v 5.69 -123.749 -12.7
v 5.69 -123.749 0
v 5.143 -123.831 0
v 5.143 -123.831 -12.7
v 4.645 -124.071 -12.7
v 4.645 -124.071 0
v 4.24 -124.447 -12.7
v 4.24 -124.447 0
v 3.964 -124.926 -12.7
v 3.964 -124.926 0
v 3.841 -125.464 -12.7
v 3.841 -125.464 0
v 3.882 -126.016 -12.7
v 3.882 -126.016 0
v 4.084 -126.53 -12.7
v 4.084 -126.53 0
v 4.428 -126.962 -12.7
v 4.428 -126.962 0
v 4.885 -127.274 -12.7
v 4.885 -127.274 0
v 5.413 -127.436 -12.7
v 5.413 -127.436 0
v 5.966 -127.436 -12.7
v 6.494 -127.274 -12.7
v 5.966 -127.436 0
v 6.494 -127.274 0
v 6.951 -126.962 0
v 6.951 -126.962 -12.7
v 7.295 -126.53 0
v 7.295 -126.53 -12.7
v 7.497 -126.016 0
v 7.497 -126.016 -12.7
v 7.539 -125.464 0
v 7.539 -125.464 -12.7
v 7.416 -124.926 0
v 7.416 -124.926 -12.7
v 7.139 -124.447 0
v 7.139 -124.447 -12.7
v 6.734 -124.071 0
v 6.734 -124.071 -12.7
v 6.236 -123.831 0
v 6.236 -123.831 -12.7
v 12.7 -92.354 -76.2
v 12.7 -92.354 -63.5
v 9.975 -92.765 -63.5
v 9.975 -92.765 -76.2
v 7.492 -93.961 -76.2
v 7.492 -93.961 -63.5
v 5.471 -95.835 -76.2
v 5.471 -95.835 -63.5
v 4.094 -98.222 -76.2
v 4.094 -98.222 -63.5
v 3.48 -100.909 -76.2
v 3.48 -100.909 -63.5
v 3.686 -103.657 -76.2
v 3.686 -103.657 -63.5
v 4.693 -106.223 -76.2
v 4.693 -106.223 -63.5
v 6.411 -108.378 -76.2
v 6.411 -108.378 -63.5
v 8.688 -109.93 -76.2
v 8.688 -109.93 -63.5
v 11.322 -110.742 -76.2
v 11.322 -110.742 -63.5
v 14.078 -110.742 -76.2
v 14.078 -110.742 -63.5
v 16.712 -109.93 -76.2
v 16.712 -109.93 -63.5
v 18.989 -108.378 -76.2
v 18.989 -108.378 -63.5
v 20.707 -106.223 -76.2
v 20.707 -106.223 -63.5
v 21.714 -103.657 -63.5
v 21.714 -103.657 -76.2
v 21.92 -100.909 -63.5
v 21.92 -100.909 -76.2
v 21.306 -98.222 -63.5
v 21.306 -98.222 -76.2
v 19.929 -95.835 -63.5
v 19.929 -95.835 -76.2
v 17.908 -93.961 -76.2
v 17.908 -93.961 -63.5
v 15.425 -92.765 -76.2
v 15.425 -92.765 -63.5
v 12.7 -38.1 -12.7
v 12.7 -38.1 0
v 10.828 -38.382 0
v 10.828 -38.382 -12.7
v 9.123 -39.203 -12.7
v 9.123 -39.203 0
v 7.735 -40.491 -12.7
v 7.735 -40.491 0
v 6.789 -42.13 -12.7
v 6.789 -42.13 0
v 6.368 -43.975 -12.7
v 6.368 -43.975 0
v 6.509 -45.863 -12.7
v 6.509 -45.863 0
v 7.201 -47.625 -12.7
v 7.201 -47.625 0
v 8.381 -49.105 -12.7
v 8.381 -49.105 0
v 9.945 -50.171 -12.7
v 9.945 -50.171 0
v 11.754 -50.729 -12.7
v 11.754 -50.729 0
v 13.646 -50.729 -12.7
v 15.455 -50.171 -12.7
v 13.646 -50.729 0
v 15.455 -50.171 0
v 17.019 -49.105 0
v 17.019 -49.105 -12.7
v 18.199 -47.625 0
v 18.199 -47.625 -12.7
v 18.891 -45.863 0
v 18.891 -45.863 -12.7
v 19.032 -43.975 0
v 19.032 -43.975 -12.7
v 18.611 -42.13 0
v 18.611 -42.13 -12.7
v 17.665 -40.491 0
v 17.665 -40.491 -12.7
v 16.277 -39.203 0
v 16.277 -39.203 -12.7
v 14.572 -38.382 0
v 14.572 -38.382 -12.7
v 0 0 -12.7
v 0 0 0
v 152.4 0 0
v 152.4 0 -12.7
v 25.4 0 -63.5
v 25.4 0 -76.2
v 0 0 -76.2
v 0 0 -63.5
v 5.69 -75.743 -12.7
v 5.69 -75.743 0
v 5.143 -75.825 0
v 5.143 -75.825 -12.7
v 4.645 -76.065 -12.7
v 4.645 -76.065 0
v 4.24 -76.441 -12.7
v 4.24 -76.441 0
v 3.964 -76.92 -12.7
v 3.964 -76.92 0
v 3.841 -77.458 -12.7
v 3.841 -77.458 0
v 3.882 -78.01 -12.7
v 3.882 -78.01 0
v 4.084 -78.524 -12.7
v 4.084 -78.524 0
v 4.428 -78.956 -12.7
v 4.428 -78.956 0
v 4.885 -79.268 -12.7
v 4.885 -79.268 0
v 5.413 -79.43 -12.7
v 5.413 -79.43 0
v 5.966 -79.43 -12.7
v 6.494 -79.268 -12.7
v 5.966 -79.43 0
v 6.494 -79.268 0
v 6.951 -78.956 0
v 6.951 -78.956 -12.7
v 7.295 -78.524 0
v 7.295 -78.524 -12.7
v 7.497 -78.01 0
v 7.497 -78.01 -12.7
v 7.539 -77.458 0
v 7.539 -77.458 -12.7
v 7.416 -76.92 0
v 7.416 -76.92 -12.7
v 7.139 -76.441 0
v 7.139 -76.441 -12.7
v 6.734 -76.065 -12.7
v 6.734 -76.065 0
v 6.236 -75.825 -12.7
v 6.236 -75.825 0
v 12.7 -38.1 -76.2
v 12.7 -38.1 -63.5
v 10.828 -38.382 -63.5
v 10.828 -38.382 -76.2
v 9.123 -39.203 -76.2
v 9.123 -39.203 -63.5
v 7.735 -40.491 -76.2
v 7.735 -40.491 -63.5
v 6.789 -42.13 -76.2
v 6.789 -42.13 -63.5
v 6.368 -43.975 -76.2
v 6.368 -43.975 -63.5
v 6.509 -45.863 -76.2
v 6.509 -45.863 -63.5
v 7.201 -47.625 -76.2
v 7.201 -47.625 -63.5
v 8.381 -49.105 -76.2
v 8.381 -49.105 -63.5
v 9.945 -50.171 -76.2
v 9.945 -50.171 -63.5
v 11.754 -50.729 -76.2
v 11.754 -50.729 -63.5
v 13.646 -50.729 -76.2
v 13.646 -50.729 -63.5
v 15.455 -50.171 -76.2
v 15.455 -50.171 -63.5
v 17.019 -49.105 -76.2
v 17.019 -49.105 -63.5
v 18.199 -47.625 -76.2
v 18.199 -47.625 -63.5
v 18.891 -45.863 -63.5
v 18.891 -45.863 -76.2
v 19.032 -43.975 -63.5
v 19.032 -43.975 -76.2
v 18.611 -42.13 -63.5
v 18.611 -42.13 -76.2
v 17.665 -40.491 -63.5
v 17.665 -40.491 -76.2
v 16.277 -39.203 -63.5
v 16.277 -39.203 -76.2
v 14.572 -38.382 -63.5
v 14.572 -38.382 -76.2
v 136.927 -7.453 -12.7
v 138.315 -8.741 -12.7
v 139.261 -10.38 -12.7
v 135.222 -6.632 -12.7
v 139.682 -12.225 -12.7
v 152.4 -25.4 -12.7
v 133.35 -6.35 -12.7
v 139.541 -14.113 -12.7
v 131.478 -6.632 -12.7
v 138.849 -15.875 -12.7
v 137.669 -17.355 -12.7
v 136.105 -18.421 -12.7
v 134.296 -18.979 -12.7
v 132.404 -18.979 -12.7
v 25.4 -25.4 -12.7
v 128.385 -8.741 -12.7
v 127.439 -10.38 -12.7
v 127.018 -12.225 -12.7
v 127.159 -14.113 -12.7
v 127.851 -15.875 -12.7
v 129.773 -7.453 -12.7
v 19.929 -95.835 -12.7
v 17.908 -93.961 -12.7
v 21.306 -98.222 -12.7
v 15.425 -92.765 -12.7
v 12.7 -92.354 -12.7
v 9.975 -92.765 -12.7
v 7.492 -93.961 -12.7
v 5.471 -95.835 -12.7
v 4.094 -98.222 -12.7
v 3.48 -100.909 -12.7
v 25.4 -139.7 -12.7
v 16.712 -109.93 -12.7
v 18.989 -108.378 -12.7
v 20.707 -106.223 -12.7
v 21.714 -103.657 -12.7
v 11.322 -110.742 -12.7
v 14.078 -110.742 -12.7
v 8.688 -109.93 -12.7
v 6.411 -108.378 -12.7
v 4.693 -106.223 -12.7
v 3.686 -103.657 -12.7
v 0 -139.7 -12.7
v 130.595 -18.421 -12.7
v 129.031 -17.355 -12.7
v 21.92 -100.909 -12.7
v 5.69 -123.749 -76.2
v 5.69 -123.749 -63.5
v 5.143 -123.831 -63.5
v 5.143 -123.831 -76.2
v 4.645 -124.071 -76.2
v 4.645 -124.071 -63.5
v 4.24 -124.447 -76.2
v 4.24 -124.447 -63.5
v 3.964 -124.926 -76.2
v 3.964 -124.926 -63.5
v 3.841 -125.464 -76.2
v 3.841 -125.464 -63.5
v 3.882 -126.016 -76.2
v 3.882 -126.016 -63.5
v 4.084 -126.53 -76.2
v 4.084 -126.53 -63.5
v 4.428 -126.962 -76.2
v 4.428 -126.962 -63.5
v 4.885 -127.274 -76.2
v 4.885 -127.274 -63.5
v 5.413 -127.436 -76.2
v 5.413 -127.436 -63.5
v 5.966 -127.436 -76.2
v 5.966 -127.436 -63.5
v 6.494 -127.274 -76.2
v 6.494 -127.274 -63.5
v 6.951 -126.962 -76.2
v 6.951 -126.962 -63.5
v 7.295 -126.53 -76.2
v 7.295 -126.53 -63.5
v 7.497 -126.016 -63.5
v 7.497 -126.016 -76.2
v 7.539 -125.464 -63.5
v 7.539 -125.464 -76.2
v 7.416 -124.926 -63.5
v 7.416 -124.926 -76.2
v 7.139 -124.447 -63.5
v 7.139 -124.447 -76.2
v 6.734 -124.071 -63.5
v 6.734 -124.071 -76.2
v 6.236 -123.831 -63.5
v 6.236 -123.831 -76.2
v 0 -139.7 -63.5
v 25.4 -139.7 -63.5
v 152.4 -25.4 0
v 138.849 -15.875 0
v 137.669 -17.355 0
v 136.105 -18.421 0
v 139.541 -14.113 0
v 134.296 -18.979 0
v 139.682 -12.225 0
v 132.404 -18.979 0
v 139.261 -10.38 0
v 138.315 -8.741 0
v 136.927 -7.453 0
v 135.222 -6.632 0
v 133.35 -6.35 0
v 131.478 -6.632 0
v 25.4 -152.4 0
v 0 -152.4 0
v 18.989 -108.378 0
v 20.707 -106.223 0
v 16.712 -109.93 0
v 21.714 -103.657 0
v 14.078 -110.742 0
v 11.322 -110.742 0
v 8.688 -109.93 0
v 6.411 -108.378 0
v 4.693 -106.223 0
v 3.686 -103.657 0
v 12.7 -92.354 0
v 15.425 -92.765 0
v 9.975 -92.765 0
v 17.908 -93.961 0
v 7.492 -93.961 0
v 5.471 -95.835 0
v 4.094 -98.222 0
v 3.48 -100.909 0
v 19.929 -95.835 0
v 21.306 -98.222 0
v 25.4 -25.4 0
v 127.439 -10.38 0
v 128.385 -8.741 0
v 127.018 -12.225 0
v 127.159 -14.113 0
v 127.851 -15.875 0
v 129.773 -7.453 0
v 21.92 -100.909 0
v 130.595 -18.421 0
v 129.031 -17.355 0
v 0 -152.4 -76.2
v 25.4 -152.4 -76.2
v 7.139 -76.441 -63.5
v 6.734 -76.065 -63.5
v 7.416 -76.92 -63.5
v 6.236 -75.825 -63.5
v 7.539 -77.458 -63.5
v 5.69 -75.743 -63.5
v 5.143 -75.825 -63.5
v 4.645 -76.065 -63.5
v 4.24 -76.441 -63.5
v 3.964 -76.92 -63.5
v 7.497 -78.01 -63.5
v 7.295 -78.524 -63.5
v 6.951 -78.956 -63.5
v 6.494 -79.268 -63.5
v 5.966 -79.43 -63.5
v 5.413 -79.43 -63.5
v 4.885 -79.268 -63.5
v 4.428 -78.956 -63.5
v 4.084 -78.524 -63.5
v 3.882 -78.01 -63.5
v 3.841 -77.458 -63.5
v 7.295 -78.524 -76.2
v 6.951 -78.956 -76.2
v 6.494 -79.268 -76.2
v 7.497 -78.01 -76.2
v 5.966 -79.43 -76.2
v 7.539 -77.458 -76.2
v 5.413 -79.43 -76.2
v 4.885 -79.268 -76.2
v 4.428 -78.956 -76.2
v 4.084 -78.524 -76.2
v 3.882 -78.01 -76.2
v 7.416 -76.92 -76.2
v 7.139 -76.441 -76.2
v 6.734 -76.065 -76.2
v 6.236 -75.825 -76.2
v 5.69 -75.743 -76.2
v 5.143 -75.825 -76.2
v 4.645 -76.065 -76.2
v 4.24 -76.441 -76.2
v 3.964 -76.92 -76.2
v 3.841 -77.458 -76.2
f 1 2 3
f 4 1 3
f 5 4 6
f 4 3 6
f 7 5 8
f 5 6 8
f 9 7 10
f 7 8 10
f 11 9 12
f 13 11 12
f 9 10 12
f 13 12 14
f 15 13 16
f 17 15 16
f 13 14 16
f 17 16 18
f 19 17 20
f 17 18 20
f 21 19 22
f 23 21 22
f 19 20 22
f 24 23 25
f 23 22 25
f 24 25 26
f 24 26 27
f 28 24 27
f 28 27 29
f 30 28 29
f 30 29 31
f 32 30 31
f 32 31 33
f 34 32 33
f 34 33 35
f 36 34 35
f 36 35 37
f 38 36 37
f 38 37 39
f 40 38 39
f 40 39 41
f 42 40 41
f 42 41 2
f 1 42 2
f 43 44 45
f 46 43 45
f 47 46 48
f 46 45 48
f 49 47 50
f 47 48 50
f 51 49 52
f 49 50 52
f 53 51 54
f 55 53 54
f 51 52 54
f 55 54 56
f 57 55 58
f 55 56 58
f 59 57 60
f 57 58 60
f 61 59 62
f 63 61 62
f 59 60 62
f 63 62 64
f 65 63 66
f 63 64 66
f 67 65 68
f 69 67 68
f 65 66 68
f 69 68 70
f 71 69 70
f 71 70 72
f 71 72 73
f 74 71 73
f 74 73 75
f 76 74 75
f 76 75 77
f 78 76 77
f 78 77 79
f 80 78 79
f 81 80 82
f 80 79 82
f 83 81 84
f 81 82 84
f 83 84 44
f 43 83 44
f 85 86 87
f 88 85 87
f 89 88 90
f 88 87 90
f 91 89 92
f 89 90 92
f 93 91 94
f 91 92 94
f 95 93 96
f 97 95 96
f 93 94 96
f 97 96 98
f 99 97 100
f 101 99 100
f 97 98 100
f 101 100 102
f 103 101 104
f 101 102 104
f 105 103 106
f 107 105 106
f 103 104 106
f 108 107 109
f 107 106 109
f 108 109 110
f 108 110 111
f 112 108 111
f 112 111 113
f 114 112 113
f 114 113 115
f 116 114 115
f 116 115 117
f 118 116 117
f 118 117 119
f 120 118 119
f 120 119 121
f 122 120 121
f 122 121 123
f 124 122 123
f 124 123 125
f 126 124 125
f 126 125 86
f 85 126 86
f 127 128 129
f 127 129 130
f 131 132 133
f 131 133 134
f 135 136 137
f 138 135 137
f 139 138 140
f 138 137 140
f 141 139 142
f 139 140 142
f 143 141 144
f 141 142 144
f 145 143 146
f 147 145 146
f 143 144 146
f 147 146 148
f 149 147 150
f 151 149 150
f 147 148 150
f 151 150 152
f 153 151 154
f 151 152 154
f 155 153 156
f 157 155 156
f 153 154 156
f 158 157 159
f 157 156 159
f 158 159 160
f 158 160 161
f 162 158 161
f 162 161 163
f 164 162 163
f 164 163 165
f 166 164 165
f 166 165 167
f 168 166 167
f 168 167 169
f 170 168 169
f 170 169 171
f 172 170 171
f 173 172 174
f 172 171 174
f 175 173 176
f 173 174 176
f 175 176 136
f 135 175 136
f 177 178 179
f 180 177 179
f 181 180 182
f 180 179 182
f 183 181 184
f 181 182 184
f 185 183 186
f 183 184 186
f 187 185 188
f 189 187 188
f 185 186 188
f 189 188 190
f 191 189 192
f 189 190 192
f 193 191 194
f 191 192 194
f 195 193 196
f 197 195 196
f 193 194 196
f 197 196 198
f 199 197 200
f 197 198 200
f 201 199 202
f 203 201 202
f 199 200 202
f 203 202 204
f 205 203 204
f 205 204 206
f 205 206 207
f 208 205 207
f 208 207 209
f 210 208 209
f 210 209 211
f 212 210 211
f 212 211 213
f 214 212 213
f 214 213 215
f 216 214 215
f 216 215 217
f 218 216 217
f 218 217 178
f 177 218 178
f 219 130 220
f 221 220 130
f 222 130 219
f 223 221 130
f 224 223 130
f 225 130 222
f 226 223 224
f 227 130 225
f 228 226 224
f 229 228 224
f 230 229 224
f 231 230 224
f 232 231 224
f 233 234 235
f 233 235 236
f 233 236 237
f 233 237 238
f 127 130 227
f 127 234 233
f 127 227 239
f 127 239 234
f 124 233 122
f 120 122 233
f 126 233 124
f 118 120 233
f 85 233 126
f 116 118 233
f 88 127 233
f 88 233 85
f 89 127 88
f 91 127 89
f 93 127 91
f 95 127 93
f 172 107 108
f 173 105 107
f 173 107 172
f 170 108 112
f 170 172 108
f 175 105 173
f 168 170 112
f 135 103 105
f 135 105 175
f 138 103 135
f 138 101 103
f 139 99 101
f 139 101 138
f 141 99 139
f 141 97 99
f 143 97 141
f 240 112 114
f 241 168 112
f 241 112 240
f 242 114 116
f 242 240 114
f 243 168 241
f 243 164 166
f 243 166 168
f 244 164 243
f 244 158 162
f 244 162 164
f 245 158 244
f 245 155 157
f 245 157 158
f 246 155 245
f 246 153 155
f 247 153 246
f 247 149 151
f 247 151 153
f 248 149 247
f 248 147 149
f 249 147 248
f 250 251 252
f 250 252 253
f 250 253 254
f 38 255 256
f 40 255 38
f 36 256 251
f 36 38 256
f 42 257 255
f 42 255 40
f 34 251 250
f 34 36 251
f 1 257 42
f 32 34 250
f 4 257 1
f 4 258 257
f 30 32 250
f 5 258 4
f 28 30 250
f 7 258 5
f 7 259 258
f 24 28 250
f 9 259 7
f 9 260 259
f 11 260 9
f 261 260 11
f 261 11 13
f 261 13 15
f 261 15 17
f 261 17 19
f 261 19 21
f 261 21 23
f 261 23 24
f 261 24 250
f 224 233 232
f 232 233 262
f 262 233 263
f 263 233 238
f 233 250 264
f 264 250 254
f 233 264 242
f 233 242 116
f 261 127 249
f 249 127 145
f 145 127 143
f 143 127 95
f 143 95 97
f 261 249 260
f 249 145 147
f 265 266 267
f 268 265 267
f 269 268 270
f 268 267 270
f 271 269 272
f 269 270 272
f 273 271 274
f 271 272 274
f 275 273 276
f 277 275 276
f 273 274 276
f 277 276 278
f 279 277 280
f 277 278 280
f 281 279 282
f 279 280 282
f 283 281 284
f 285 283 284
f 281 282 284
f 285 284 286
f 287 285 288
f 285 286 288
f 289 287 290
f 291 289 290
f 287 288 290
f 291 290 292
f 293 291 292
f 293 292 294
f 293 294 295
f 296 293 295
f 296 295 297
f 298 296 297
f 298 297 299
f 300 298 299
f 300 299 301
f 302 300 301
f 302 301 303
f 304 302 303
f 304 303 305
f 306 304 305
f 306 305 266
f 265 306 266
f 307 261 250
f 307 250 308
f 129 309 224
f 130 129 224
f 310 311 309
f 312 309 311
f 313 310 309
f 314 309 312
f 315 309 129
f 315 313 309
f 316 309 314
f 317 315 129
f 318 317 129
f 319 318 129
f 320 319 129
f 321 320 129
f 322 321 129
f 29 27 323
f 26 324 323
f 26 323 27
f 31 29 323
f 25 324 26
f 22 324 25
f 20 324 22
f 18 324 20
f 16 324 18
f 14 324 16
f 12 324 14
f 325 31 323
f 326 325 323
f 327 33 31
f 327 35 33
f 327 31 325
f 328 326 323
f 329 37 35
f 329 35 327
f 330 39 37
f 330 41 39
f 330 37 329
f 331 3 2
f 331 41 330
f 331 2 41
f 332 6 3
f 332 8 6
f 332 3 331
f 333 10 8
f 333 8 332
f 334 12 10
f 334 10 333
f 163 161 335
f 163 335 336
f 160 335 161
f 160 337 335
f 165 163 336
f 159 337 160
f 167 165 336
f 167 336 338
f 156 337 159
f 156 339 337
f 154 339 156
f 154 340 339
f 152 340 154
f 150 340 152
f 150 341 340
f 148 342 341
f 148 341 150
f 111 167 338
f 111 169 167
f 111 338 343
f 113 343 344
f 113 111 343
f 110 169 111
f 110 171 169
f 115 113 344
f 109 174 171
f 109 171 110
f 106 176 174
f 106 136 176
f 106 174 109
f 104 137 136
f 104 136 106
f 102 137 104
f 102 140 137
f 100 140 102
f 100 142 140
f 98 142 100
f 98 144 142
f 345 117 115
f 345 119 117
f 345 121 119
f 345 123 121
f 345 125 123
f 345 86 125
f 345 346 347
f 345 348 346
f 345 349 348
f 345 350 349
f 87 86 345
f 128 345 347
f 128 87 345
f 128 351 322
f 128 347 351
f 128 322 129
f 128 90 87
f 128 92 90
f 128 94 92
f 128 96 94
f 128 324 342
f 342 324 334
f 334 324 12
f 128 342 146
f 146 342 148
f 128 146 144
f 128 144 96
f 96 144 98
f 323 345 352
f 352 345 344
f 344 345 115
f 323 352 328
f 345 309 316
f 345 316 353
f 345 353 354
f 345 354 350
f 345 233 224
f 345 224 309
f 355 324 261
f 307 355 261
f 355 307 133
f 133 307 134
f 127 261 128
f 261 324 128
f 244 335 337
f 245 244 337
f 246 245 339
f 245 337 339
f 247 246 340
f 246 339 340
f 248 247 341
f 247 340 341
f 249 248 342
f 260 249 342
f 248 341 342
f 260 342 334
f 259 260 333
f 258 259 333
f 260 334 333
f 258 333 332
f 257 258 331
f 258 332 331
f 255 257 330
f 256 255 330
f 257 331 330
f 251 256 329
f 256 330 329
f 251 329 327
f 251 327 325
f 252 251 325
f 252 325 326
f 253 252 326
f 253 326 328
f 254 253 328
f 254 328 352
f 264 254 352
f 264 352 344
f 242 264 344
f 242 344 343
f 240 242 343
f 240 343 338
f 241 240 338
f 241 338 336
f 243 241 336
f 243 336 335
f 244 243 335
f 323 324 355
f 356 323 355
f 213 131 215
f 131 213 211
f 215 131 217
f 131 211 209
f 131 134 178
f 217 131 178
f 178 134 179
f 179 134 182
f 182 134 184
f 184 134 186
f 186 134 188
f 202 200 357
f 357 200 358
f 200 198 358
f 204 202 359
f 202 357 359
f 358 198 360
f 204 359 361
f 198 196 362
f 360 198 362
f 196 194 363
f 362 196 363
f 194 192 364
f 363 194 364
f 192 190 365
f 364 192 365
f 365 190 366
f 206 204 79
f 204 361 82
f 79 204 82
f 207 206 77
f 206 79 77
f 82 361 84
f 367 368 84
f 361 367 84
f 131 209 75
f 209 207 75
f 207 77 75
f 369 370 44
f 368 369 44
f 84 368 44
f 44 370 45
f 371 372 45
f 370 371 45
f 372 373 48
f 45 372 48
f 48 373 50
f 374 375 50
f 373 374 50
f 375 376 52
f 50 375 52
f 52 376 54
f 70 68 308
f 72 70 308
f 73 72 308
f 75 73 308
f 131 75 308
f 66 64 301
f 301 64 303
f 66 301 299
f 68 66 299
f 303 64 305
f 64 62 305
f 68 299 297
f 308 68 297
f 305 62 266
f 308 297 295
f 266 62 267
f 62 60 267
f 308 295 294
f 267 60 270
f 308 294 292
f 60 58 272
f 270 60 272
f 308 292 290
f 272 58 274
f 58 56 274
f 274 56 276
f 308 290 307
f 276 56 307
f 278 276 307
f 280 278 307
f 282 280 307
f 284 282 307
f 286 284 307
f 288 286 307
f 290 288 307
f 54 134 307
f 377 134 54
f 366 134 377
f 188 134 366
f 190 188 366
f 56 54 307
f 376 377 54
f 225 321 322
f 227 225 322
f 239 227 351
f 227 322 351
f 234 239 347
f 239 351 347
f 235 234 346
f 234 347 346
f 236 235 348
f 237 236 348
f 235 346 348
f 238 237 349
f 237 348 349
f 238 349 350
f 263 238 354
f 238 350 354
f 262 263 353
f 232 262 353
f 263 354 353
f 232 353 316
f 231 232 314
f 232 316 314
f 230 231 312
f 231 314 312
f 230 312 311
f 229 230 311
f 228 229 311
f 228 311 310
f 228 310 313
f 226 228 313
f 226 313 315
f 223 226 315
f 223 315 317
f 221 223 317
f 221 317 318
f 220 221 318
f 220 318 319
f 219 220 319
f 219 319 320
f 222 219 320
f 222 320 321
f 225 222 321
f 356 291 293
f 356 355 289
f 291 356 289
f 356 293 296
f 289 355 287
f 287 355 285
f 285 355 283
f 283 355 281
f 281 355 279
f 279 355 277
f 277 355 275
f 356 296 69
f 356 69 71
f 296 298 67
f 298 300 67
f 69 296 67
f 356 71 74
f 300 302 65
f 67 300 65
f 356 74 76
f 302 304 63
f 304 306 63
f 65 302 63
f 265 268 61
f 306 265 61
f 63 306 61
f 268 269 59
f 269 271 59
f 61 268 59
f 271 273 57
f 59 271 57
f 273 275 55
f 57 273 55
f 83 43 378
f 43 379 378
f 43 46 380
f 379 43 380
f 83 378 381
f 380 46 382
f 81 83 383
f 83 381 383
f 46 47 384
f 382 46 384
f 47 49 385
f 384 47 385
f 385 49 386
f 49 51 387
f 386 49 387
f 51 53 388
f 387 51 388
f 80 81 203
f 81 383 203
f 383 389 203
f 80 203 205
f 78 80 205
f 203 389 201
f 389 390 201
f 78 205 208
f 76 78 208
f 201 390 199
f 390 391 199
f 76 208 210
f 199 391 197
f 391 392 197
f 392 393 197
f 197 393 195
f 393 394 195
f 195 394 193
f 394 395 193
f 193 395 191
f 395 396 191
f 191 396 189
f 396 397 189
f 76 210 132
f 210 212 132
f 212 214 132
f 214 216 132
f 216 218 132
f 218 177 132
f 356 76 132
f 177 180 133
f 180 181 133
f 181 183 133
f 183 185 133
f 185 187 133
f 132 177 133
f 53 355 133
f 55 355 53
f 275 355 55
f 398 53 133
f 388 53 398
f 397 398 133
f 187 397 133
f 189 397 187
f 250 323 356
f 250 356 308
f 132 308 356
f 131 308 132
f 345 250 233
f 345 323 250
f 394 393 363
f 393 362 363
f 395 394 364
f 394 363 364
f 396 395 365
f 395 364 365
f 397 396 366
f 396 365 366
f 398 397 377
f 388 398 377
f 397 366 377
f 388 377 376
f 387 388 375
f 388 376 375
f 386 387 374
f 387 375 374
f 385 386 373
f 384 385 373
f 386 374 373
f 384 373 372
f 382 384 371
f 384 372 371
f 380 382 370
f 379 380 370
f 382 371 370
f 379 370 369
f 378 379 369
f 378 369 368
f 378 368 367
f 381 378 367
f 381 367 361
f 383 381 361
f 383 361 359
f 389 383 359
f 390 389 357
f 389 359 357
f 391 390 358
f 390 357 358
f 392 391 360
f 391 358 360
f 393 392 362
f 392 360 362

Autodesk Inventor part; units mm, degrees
ref_plane "YZ Plane" through (0, 0, 0) normal (1, 0, 0) x (0, 1, 0)
ref_plane "XZ Plane" through (0, 0, 0) normal (0, 1, 0) x (-1, 0, 0)
ref_plane "XY Plane" through (0, 0, 0) normal (0, 0, 1) x (1, 0, 0)
sketch "Sketch1" plane through (0, 0, 0) normal (1, 0, 0) x (0, 1, 0)
  line L0 (0, 0) -> (-152.4, 0)
  line L1 (-152.4, 0) -> (-152.4, -12.7)
  line L2 (-152.4, -12.7) -> (0, -12.7)
  line L3 (0, -12.7) -> (0, 0)
  line L4 (0, -12.7) -> (-12.7, -12.7)
  line L5 (-12.7, -63.5) -> (0, -63.5)
  line L6 (0, -63.5) -> (-152.4, -63.5)
  line L7 (-152.4, -63.5) -> (-152.4, -76.2)
  line L8 (-152.4, -76.2) -> (0, -76.2)
  line L9 (0, -76.2) -> (0, -63.5)
  line L10 (-152.4, 0) -> (-139.7, 0)
  line L11 (-139.7, 0) -> (-139.7, -76.2)
  line L12 (-139.7, -76.2) -> (-152.4, -76.2)
  line L13 (-152.4, -76.2) -> (-152.4, 0)
  dimension "d1" = 12.7
  dimension "d4" = 12.7
  dimension "d63" = 12.7
  dimension "d64" = 152.4
  dimension "d65" = 152.4
  dimension "d66" = 50.8
extrude "Extrusion1" add sketch "Sketch1" along normal blind 25.4
sketch "Sketch2" plane through (0, -152.4, -76.2) normal (0, 0, -1) x (-1, 0, 0)
  line L0 (0, 152.4) -> (-25.4, 152.4) projected
  line L1 (-25.4, 0) -> (-25.4, 152.4) projected
  point P0 (-12.7, 107.95)
  dimension "d8" = 44.45
  dimension "d9" = 25.4
  dimension "d10" = 12.7
hole "Hole1" at (12.7, -44.45, -76.2) direction (0, 0, 1) diameter 12.7 end through all
sketch "Sketch3" plane through (0, -152.4, -76.2) normal (0, 0, -1) x (-1, 0, 0)
  circle A0 centre (-12.7, 107.95) radius 6.35 projected
  line L0 (0, 0) -> (0, 152.4) projected
  line L1 (0, 152.4) -> (-25.4, 152.4) projected
  line L2 (-25.4, 0) -> (-25.4, 152.4) projected
  line L3 (0, 0) -> (-25.4, 0) projected
  point P0 (-12.7, 50.8)
  dimension "d18" = 25.4
  dimension "d19" = 12.7
  dimension "d20" = 50.8
hole "Hole2" at (12.7, -101.6, -76.2) direction (0, 0, 1) diameter 18.4912 end through all
sketch "Sketch4" plane through (0, -152.4, -76.2) normal (0, 0, -1) x (-1, 0, 0)
  circle A0 centre (-12.7, 50.8) radius 9.2456 projected
  circle A1 centre (-12.7, 107.95) radius 6.35 projected
  line L0 (0, 0) -> (0, 152.4) projected
  line L1 (0, 152.4) -> (-25.4, 152.4) projected
  line L2 (-25.4, 0) -> (-25.4, 152.4) projected
  line L3 (0, 0) -> (-25.4, 0) projected
  point P0 (-5.6896, 26.797)
  point P1 (-5.6896, 74.803)
  dimension "d28" = 48.006
  dimension "d29" = 7.0104
  dimension "d30" = 7.0104
  dimension "d31" = 24.003
hole "Hole3" at (5.6896, -125.603, -76.2) at (5.6896, -77.597, -76.2) direction (0, 0, 1) diameter 3.7084 end through all
sketch "Sketch5" plane through (25.4, 0, 0) normal (1, 0, 0) x (0, 0, -1)
  line L0 (0, 0) -> (12.7, 0)
  line L1 (12.7, 0) -> (12.7, -25.4)
  line L2 (12.7, -25.4) -> (0, -25.4)
  line L3 (0, -25.4) -> (0, 0)
  line L4 (0, 0) -> (0, -152.4) projected
  line L5 (12.7, 0) -> (0, 0) projected
  dimension "d39" = 12.7
  dimension "d67" = 25.4
  dimension "d68" = 0
  dimension "d69" = 0
extrude "Extrusion2" add sketch "Sketch5" along normal blind 127
sketch "Sketch8" plane through (0, -139.7, -12.7) normal (0, 0, -1) x (-1, 0, 0)
  line L0 (-152.4, 114.3) -> (-152.4, 139.7) projected
  line L1 (0, 139.7) -> (-152.4, 139.7) projected
  point P0 (-133.35, 127)
  dimension "d70" = 19.05
  dimension "d71" = 25.4
  dimension "d72" = 12.7
hole "Hole6" at (133.35, -12.7, -12.7) direction (0, 0, 1) diameter 12.7 end through all
equation "\"d4\" = d1"
equation "\"d65\" = d64"
equation "\"d10\" = 0.5 * d9"
equation "\"d19\" = 0.5 * d18"
equation "\"d30\" = d29"
equation "\"d31\" = 0.5 * d28"
equation "\"d72\" = 0.5 * d71"
properties part number "shooter" material "Aluminum 6061"
